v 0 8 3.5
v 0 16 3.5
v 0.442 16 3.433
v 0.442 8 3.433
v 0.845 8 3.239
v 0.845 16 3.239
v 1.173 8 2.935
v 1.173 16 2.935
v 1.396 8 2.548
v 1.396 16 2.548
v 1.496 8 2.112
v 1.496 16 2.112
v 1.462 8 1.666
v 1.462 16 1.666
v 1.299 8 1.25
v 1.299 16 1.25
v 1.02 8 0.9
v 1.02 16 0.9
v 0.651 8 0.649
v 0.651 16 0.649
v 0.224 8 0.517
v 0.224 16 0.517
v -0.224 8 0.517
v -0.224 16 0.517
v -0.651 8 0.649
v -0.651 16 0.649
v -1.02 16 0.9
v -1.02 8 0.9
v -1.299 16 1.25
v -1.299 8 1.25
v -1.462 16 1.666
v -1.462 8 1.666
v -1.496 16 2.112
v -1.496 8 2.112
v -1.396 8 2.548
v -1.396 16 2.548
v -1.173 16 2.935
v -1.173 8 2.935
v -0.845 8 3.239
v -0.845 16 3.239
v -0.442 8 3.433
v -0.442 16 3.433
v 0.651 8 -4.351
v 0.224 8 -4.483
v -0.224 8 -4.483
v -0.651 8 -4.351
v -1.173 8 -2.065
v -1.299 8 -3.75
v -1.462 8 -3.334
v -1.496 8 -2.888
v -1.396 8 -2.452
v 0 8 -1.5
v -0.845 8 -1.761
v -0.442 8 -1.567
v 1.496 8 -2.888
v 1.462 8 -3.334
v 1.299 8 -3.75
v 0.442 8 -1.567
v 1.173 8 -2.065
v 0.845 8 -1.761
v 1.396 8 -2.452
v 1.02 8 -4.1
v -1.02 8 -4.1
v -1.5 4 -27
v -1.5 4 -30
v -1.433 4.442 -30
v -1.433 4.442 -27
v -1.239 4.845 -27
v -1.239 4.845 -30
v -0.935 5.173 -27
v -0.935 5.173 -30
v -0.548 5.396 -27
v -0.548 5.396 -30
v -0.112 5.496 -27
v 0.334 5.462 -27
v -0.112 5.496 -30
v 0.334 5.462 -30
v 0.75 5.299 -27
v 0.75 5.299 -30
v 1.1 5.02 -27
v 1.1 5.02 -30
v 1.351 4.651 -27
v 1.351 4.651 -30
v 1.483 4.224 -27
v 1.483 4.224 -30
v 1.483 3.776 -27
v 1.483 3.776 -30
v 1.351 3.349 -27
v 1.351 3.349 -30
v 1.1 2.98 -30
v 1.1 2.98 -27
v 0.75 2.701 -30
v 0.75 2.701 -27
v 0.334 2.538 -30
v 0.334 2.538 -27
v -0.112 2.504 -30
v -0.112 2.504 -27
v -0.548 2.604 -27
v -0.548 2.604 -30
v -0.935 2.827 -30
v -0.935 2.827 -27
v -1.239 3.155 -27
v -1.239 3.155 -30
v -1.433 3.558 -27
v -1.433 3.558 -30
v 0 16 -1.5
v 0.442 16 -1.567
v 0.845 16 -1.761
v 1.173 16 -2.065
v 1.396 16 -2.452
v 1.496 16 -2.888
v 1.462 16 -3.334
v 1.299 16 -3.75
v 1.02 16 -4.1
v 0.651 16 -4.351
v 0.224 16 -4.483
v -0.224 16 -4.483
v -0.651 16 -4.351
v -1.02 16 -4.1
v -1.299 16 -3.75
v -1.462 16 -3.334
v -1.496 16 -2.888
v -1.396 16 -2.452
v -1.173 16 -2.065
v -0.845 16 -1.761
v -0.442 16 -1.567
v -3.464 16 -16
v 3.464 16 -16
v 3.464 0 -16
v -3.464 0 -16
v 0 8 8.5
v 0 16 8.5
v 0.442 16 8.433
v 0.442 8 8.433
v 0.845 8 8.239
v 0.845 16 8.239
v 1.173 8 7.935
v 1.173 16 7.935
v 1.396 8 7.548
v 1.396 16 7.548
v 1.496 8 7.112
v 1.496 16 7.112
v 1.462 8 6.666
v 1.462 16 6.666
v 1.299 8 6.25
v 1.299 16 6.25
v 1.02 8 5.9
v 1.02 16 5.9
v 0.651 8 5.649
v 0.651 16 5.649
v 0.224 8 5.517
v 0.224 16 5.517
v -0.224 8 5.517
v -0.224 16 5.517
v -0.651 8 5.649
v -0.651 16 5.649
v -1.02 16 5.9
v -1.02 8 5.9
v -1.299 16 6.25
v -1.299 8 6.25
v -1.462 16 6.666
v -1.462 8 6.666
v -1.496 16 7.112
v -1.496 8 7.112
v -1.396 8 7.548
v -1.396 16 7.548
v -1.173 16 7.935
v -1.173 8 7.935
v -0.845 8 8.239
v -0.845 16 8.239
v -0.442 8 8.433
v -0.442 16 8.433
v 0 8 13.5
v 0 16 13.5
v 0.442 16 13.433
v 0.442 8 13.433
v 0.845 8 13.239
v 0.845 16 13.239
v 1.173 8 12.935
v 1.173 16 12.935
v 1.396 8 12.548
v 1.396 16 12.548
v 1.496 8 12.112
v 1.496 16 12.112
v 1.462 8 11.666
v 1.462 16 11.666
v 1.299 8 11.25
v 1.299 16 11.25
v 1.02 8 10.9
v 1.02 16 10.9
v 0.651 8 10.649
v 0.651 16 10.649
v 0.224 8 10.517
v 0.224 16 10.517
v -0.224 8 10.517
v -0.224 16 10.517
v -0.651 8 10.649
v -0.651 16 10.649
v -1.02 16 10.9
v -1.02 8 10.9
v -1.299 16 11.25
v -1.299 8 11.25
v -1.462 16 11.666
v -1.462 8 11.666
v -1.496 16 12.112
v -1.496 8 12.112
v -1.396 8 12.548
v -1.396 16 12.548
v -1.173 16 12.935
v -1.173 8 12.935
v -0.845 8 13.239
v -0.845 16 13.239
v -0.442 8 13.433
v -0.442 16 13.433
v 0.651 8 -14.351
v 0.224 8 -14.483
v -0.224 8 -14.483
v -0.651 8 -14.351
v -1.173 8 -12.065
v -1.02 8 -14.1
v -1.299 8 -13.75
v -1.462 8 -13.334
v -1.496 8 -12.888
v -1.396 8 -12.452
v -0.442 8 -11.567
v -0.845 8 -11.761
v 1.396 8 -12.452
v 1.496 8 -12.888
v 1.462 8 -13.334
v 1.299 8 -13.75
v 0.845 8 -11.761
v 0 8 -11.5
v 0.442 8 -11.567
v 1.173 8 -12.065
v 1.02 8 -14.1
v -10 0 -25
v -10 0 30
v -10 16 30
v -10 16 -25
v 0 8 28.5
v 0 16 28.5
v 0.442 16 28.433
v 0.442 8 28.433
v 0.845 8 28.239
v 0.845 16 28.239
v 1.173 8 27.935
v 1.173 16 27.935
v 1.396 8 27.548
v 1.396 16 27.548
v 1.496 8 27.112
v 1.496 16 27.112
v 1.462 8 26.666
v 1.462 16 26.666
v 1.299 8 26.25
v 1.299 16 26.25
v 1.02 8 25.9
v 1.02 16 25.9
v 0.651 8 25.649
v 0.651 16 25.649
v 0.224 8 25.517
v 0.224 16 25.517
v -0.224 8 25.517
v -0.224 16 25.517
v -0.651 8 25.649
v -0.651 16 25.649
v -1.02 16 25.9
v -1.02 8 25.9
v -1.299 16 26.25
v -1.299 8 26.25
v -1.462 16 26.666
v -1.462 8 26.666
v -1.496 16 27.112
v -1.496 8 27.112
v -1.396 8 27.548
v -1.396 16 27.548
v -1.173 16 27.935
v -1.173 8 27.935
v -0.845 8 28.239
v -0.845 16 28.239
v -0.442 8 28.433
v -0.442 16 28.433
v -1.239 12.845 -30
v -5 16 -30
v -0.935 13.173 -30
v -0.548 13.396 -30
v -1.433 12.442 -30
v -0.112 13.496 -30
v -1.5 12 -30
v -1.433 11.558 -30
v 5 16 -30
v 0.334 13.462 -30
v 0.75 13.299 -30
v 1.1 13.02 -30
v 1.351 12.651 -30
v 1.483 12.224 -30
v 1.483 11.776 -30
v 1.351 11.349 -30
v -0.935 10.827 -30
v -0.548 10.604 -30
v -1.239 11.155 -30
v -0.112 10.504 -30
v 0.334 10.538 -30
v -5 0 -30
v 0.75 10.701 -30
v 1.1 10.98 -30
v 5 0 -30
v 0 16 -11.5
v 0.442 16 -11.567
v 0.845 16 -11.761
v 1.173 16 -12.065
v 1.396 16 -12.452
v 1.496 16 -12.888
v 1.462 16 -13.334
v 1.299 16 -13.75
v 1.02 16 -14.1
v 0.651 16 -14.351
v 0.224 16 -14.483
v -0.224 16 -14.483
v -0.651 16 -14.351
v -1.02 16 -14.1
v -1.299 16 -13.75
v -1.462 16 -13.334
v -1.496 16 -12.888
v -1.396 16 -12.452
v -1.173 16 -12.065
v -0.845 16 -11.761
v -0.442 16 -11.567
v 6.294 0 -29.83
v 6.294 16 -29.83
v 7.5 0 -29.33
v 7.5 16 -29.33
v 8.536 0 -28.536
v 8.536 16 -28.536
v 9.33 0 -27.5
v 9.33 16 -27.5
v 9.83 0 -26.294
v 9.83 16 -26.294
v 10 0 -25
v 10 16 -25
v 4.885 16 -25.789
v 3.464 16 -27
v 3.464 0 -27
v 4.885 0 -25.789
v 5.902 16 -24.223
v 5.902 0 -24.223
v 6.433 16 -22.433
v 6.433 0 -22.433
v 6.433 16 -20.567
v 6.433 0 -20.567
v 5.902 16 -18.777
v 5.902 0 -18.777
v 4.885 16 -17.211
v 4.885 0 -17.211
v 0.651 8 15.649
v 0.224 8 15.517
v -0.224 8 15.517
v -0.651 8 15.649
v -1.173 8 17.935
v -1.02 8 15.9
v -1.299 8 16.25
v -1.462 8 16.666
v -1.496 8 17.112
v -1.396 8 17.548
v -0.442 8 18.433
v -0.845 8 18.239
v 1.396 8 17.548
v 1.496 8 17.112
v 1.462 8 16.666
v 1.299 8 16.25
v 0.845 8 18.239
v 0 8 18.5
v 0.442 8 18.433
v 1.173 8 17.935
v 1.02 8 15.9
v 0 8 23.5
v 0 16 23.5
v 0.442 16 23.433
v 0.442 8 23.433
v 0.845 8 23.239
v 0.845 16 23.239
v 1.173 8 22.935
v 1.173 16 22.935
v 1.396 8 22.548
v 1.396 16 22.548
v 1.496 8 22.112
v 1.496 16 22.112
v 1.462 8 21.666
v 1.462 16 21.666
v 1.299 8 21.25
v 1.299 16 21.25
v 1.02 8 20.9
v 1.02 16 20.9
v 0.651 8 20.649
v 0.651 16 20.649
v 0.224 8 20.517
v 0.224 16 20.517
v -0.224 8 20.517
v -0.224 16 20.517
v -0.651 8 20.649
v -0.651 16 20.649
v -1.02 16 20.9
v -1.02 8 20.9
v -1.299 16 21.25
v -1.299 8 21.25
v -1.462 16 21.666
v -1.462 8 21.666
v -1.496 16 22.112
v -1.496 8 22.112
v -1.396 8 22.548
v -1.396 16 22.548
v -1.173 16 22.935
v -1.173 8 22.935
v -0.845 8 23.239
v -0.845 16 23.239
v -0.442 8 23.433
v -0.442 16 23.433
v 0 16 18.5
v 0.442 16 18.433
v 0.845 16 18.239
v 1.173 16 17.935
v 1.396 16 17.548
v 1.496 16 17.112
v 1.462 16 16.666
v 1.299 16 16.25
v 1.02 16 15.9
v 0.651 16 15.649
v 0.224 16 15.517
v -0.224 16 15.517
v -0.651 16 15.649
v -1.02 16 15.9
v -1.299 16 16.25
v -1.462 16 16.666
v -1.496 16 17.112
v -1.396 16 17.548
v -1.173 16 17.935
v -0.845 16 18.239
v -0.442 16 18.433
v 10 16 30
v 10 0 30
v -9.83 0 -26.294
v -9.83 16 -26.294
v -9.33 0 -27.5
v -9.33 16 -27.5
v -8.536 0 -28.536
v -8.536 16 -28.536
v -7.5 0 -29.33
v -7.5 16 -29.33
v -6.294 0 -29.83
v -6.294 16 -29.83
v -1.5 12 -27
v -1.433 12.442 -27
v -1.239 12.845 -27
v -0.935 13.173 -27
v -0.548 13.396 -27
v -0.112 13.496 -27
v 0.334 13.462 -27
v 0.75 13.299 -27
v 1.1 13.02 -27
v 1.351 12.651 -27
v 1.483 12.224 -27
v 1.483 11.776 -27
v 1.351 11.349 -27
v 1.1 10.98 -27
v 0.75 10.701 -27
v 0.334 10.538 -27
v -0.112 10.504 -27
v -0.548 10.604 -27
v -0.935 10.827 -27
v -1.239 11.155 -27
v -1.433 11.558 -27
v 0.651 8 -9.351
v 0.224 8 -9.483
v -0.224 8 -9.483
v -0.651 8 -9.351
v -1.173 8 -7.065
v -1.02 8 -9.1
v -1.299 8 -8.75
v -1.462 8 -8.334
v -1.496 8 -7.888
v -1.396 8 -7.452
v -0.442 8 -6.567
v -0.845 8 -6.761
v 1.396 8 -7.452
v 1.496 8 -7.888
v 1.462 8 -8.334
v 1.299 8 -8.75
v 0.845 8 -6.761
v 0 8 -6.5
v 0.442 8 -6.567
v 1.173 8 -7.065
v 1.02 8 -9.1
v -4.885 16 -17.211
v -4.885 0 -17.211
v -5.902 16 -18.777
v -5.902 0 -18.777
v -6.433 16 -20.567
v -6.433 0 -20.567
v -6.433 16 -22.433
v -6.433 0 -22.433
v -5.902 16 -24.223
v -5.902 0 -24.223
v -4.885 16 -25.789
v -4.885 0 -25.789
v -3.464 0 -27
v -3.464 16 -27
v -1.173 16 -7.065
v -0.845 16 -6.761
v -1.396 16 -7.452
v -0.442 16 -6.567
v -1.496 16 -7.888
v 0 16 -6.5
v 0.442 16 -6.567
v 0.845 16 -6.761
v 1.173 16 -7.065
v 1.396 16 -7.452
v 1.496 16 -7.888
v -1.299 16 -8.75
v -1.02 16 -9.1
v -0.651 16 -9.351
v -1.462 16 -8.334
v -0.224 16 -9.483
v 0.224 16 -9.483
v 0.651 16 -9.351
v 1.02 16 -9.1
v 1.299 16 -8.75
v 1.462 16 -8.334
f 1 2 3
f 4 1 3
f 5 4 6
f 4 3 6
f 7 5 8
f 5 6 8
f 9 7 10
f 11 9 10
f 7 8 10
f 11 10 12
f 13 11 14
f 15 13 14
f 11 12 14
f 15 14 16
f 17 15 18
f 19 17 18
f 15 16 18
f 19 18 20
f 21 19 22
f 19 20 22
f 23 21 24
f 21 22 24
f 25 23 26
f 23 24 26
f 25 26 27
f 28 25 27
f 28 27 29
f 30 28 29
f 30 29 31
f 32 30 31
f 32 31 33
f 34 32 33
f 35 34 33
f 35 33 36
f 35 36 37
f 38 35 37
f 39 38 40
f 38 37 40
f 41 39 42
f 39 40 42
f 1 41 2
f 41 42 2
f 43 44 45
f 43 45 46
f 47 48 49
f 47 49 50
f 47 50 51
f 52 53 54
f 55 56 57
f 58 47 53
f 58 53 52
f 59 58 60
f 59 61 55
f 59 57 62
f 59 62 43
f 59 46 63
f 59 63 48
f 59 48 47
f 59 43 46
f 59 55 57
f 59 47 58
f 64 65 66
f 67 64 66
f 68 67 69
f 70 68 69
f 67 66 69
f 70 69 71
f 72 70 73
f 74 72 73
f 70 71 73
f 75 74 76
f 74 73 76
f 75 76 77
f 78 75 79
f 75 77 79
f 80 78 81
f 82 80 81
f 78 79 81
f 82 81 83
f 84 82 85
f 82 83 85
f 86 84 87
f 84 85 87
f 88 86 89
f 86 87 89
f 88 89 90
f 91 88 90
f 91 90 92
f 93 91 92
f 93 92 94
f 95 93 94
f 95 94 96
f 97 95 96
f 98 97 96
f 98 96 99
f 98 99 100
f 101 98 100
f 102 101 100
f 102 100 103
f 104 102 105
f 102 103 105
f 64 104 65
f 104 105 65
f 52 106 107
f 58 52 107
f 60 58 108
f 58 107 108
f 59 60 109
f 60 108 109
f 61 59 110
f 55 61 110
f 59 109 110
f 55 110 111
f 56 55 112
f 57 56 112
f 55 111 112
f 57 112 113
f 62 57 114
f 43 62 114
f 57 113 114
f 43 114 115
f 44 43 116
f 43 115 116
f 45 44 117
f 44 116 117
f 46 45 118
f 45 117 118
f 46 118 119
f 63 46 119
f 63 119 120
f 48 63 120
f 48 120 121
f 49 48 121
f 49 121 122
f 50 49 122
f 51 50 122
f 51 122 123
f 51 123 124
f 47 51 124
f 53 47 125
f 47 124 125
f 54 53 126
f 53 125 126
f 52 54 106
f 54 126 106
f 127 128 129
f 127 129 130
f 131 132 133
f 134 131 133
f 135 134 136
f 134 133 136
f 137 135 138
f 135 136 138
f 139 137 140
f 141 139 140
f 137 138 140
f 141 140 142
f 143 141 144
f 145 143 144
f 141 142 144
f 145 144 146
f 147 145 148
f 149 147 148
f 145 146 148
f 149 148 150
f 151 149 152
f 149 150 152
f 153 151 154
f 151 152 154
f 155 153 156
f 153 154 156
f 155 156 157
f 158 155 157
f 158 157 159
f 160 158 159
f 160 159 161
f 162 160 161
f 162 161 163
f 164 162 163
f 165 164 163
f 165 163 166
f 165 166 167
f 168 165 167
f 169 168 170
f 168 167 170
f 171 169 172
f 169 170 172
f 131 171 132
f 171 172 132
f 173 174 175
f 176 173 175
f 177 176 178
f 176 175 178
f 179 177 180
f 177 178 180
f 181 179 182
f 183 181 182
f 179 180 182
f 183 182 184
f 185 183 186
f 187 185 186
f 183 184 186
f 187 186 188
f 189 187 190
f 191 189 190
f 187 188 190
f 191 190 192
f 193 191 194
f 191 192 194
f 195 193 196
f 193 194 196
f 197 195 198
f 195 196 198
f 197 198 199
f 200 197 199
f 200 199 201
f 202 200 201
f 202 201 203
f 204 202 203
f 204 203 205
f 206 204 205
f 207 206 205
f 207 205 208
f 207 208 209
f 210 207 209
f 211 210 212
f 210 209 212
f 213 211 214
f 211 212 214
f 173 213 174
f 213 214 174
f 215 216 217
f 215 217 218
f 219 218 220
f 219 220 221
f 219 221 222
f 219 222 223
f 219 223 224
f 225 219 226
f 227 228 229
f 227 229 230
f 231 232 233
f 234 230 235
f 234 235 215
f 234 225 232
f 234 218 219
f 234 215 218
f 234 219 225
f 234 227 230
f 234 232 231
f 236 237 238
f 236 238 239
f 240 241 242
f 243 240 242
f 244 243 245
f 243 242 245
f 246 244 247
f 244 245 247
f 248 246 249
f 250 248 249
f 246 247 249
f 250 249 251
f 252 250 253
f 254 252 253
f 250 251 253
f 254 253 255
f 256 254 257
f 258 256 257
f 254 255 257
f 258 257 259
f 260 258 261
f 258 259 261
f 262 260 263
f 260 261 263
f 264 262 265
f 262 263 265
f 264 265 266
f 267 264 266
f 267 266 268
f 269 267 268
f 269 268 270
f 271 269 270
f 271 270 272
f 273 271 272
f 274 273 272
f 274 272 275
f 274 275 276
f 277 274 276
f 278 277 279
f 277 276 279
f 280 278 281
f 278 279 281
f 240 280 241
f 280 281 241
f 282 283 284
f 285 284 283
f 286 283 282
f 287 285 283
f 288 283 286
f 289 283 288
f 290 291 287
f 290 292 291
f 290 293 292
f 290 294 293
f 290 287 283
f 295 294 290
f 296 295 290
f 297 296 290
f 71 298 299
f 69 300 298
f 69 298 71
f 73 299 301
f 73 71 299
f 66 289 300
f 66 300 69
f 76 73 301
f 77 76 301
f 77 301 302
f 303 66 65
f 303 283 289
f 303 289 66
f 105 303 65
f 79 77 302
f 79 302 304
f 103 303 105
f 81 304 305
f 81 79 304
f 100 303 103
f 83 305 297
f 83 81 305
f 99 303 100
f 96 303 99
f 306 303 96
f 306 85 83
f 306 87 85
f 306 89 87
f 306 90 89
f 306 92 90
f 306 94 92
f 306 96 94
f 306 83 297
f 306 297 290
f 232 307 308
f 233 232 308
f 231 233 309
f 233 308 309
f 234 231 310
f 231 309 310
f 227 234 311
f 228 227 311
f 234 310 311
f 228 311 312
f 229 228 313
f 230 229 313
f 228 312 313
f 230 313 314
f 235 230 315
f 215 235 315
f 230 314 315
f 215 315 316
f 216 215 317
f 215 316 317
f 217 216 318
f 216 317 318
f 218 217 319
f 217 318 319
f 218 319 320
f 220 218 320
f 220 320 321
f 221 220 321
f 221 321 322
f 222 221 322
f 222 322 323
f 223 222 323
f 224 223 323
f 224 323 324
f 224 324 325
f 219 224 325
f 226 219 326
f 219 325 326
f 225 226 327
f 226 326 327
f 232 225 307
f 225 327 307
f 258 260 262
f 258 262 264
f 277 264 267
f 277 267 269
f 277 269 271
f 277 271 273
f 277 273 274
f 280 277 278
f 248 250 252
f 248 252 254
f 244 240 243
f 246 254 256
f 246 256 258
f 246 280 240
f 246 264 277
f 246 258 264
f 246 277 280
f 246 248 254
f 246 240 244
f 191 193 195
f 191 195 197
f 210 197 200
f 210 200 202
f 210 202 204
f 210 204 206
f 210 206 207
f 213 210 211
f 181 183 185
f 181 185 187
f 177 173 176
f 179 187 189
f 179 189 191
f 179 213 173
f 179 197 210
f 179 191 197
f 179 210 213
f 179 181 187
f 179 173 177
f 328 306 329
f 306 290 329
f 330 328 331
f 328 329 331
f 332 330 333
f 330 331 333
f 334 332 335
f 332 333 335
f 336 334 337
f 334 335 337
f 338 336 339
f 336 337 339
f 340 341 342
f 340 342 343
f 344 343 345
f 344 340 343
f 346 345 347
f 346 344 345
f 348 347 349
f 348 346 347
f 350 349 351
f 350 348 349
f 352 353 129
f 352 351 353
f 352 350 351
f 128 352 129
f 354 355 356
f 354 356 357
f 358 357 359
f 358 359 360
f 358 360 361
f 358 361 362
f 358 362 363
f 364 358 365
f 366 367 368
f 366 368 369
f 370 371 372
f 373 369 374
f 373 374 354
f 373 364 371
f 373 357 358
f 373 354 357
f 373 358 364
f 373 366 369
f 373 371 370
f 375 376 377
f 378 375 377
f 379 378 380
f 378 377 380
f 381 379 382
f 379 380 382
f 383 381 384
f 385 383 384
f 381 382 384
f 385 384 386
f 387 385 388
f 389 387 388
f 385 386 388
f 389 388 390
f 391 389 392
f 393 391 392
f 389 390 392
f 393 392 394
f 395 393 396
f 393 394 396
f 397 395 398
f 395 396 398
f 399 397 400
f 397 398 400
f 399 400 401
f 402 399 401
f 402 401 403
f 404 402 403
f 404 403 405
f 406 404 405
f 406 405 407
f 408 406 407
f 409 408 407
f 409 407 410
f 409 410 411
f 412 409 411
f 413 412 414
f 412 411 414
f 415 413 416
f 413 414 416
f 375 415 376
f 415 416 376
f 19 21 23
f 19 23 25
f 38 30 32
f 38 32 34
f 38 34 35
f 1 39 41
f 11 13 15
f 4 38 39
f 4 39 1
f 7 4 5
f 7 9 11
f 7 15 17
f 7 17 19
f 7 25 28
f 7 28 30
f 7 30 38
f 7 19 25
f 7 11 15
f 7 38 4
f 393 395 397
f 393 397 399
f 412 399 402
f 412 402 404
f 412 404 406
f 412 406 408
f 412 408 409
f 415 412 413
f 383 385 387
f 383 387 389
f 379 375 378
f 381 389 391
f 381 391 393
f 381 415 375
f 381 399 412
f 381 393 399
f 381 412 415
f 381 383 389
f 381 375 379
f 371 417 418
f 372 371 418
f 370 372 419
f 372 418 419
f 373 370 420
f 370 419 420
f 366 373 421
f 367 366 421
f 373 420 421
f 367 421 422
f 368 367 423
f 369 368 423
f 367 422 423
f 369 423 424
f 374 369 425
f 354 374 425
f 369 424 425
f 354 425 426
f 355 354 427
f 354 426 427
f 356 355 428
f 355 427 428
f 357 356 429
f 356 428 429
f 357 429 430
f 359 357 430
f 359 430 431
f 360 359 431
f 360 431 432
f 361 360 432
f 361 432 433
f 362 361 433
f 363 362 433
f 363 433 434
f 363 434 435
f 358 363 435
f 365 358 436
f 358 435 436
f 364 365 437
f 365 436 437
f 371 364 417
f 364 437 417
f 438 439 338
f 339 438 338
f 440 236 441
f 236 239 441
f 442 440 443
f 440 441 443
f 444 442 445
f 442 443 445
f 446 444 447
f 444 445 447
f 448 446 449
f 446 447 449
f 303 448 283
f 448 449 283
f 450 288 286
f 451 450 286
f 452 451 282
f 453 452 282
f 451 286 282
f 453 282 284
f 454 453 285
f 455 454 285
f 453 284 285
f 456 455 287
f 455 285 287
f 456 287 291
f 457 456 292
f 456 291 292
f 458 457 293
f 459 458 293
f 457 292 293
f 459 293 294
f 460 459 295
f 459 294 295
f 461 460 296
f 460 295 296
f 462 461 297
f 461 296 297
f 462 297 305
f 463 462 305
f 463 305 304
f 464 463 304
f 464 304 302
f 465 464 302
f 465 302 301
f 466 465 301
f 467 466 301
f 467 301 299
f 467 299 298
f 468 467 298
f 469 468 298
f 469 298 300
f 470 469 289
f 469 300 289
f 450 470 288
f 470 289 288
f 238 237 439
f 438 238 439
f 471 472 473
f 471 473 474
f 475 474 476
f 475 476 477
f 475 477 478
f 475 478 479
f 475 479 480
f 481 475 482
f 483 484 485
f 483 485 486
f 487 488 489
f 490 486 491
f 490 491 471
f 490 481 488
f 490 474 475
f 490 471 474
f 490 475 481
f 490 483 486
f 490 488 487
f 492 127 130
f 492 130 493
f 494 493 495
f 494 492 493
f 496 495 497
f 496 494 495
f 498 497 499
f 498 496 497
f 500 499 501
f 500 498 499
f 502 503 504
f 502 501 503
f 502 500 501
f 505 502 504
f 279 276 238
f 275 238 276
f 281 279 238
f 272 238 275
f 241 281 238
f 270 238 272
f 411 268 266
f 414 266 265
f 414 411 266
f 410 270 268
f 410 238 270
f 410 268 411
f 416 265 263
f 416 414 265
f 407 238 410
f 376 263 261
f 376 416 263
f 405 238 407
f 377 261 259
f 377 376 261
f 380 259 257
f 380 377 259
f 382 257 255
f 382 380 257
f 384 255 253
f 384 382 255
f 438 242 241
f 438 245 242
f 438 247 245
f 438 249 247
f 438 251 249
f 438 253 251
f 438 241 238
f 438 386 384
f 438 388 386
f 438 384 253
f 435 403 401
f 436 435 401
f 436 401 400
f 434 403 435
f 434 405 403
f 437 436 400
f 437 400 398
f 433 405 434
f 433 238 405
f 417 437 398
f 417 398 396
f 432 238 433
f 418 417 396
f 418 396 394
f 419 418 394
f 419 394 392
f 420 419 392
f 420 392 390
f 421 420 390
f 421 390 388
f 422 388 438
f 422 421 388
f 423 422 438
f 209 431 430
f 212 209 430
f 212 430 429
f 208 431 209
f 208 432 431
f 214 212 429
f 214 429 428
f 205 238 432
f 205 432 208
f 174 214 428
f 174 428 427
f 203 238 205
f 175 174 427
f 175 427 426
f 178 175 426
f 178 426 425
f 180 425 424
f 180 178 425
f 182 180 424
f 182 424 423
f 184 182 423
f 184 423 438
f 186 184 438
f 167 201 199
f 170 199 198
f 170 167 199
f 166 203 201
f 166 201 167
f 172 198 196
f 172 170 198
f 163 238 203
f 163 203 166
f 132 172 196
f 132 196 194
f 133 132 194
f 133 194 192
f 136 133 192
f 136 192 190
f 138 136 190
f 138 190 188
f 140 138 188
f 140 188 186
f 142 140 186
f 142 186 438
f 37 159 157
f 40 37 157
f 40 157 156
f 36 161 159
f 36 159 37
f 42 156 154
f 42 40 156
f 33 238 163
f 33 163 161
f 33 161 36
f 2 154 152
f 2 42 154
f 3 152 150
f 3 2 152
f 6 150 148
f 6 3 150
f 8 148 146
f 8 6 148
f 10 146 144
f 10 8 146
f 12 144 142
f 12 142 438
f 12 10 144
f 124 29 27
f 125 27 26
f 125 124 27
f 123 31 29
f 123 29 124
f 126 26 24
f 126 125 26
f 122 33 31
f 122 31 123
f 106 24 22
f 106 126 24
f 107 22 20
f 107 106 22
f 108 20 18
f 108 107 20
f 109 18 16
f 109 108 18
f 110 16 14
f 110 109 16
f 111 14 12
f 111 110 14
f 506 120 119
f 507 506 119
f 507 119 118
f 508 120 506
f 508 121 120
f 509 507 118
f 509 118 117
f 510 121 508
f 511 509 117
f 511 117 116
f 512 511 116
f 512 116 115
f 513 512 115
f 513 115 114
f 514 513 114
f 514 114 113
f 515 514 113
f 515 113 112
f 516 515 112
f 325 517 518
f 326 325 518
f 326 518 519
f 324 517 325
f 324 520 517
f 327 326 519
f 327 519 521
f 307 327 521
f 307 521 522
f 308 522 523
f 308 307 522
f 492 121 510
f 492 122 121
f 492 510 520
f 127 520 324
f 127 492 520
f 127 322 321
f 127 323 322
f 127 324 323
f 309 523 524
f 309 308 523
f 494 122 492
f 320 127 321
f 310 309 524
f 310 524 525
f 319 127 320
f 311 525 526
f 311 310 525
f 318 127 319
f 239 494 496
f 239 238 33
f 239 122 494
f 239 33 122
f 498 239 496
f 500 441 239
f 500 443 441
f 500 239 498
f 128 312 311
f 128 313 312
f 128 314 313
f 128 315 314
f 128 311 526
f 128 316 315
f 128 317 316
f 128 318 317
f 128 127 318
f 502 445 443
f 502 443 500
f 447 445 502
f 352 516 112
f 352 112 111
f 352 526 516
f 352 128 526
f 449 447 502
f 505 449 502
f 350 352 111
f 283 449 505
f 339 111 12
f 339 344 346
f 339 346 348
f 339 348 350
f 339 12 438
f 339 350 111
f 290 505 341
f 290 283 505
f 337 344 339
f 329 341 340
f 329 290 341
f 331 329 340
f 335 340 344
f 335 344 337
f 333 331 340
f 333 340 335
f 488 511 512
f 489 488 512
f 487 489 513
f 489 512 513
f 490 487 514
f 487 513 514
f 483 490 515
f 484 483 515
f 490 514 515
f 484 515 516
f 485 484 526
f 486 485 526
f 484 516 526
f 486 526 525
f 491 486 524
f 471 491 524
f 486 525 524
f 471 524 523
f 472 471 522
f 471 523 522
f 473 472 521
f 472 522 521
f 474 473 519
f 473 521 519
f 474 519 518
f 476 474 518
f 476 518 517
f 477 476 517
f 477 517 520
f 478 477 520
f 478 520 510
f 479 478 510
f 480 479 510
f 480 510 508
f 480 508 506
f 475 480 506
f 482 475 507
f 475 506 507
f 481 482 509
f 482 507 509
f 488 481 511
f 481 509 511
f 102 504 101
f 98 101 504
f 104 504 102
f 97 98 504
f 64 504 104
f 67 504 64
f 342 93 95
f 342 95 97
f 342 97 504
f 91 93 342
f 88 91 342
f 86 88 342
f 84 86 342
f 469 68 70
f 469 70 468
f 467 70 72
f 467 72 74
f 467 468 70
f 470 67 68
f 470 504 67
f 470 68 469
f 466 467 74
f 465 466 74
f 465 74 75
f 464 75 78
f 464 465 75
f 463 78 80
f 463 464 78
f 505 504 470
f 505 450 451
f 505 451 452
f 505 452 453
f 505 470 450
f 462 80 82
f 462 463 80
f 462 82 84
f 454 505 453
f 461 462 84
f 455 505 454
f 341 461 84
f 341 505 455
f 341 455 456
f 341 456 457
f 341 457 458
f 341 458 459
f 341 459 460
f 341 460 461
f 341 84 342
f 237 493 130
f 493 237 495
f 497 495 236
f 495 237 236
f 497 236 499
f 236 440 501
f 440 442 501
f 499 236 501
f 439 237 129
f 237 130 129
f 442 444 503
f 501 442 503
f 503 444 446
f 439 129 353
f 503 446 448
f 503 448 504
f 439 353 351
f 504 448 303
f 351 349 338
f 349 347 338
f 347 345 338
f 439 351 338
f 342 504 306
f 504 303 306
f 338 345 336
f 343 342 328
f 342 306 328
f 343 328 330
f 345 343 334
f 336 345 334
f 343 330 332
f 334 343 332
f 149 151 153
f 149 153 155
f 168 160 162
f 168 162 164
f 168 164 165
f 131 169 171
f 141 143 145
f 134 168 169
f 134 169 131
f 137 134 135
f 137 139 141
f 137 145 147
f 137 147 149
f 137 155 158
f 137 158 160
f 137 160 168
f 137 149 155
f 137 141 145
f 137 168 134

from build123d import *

# Parameters (mm, degrees)
CROQUIS1_W              = 20
CROQUIS1_H              = 60
SALIENTE_EXTRUIR1_DEPTH = 16
CORTAR_EXTRUIR1_DEPTH   = 36.440090293
CROQUIS3_R              = 1.5
CORTAR_EXTRUIR2_DEPTH   = 3
CROQUIS4_R              = 1.5
CORTAR_EXTRUIR3_DEPTH   = 8
REDONDEO1_R             = 5


with BuildPart() as part:
    # Croquis1 → Saliente-Extruir1 (new body)
    with BuildSketch(Plane(origin=(0, 0, 0), x_dir=(1, 0, 0), z_dir=(0, 1, 0))):
        Rectangle(CROQUIS1_W, CROQUIS1_H)
    extrude(amount=SALIENTE_EXTRUIR1_DEPTH)

    # Croquis2 → Cortar-Extruir1 (cut, through all)
    with BuildSketch(Plane(origin=(0, 16, 0), x_dir=(1, 0, 0), z_dir=(0, 1, 0))):
        with BuildLine():
            Line((-3.464101615, 27), (3.464101615, 27))
            ThreePointArc((3.464101615, 27), (6.5, 21.5), (3.464101615, 16))
            Line((3.464101615, 16), (-3.464101615, 16))
            ThreePointArc((-3.464101615, 16), (-6.5, 21.5), (-3.464101615, 27))
        make_face()
    extrude(amount=-CORTAR_EXTRUIR1_DEPTH, mode=Mode.SUBTRACT)

    # Croquis3 → Cortar-Extruir2 (cut)
    with BuildSketch(Plane(origin=(0, 0, -30), x_dir=(-1, 0, 0), z_dir=(0, 0, -1))):
        with Locations((0, 12)):
            Circle(CROQUIS3_R)
        with Locations((0, 4)):
            Circle(CROQUIS3_R)
    extrude(amount=-CORTAR_EXTRUIR2_DEPTH, mode=Mode.SUBTRACT)

    # Croquis4 → Cortar-Extruir3 (cut)
    with BuildSketch(Plane(origin=(0, 16, 0), x_dir=(1, 0, 0), z_dir=(0, 1, 0))):
        with Locations(Location((0, 13, 0), (0, 0, 270))):
            Circle(CROQUIS4_R)
        with Locations(Location((0, 8, 0), (0, 0, 270))):
            Circle(CROQUIS4_R)
        with Locations(Location((0, 3, 0), (0, 0, 270))):
            Circle(CROQUIS4_R)
        with Locations(Location((0, -2, 0), (0, 0, 270))):
            Circle(CROQUIS4_R)
        with Locations(Location((0, -7, 0), (0, 0, 270))):
            Circle(CROQUIS4_R)
        with Locations(Location((0, -12, 0), (0, 0, 270))):
            Circle(CROQUIS4_R)
        with Locations(Location((0, -17, 0), (0, 0, 270))):
            Circle(CROQUIS4_R)
        with Locations(Location((0, -22, 0), (0, 0, 270))):
            Circle(CROQUIS4_R)
        with Locations(Location((0, -27, 0), (0, 0, 270))):
            Circle(CROQUIS4_R)
    extrude(amount=-CORTAR_EXTRUIR3_DEPTH, mode=Mode.SUBTRACT)

    # Redondeo1
    redondeo1_edges = [part.edges().sort_by_distance(p)[0] for p in [
        (-10, 8, -30),
        (10, 8, -30),
    ]]
    fillet(redondeo1_edges, radius=REDONDEO1_R)


solid = part.part
